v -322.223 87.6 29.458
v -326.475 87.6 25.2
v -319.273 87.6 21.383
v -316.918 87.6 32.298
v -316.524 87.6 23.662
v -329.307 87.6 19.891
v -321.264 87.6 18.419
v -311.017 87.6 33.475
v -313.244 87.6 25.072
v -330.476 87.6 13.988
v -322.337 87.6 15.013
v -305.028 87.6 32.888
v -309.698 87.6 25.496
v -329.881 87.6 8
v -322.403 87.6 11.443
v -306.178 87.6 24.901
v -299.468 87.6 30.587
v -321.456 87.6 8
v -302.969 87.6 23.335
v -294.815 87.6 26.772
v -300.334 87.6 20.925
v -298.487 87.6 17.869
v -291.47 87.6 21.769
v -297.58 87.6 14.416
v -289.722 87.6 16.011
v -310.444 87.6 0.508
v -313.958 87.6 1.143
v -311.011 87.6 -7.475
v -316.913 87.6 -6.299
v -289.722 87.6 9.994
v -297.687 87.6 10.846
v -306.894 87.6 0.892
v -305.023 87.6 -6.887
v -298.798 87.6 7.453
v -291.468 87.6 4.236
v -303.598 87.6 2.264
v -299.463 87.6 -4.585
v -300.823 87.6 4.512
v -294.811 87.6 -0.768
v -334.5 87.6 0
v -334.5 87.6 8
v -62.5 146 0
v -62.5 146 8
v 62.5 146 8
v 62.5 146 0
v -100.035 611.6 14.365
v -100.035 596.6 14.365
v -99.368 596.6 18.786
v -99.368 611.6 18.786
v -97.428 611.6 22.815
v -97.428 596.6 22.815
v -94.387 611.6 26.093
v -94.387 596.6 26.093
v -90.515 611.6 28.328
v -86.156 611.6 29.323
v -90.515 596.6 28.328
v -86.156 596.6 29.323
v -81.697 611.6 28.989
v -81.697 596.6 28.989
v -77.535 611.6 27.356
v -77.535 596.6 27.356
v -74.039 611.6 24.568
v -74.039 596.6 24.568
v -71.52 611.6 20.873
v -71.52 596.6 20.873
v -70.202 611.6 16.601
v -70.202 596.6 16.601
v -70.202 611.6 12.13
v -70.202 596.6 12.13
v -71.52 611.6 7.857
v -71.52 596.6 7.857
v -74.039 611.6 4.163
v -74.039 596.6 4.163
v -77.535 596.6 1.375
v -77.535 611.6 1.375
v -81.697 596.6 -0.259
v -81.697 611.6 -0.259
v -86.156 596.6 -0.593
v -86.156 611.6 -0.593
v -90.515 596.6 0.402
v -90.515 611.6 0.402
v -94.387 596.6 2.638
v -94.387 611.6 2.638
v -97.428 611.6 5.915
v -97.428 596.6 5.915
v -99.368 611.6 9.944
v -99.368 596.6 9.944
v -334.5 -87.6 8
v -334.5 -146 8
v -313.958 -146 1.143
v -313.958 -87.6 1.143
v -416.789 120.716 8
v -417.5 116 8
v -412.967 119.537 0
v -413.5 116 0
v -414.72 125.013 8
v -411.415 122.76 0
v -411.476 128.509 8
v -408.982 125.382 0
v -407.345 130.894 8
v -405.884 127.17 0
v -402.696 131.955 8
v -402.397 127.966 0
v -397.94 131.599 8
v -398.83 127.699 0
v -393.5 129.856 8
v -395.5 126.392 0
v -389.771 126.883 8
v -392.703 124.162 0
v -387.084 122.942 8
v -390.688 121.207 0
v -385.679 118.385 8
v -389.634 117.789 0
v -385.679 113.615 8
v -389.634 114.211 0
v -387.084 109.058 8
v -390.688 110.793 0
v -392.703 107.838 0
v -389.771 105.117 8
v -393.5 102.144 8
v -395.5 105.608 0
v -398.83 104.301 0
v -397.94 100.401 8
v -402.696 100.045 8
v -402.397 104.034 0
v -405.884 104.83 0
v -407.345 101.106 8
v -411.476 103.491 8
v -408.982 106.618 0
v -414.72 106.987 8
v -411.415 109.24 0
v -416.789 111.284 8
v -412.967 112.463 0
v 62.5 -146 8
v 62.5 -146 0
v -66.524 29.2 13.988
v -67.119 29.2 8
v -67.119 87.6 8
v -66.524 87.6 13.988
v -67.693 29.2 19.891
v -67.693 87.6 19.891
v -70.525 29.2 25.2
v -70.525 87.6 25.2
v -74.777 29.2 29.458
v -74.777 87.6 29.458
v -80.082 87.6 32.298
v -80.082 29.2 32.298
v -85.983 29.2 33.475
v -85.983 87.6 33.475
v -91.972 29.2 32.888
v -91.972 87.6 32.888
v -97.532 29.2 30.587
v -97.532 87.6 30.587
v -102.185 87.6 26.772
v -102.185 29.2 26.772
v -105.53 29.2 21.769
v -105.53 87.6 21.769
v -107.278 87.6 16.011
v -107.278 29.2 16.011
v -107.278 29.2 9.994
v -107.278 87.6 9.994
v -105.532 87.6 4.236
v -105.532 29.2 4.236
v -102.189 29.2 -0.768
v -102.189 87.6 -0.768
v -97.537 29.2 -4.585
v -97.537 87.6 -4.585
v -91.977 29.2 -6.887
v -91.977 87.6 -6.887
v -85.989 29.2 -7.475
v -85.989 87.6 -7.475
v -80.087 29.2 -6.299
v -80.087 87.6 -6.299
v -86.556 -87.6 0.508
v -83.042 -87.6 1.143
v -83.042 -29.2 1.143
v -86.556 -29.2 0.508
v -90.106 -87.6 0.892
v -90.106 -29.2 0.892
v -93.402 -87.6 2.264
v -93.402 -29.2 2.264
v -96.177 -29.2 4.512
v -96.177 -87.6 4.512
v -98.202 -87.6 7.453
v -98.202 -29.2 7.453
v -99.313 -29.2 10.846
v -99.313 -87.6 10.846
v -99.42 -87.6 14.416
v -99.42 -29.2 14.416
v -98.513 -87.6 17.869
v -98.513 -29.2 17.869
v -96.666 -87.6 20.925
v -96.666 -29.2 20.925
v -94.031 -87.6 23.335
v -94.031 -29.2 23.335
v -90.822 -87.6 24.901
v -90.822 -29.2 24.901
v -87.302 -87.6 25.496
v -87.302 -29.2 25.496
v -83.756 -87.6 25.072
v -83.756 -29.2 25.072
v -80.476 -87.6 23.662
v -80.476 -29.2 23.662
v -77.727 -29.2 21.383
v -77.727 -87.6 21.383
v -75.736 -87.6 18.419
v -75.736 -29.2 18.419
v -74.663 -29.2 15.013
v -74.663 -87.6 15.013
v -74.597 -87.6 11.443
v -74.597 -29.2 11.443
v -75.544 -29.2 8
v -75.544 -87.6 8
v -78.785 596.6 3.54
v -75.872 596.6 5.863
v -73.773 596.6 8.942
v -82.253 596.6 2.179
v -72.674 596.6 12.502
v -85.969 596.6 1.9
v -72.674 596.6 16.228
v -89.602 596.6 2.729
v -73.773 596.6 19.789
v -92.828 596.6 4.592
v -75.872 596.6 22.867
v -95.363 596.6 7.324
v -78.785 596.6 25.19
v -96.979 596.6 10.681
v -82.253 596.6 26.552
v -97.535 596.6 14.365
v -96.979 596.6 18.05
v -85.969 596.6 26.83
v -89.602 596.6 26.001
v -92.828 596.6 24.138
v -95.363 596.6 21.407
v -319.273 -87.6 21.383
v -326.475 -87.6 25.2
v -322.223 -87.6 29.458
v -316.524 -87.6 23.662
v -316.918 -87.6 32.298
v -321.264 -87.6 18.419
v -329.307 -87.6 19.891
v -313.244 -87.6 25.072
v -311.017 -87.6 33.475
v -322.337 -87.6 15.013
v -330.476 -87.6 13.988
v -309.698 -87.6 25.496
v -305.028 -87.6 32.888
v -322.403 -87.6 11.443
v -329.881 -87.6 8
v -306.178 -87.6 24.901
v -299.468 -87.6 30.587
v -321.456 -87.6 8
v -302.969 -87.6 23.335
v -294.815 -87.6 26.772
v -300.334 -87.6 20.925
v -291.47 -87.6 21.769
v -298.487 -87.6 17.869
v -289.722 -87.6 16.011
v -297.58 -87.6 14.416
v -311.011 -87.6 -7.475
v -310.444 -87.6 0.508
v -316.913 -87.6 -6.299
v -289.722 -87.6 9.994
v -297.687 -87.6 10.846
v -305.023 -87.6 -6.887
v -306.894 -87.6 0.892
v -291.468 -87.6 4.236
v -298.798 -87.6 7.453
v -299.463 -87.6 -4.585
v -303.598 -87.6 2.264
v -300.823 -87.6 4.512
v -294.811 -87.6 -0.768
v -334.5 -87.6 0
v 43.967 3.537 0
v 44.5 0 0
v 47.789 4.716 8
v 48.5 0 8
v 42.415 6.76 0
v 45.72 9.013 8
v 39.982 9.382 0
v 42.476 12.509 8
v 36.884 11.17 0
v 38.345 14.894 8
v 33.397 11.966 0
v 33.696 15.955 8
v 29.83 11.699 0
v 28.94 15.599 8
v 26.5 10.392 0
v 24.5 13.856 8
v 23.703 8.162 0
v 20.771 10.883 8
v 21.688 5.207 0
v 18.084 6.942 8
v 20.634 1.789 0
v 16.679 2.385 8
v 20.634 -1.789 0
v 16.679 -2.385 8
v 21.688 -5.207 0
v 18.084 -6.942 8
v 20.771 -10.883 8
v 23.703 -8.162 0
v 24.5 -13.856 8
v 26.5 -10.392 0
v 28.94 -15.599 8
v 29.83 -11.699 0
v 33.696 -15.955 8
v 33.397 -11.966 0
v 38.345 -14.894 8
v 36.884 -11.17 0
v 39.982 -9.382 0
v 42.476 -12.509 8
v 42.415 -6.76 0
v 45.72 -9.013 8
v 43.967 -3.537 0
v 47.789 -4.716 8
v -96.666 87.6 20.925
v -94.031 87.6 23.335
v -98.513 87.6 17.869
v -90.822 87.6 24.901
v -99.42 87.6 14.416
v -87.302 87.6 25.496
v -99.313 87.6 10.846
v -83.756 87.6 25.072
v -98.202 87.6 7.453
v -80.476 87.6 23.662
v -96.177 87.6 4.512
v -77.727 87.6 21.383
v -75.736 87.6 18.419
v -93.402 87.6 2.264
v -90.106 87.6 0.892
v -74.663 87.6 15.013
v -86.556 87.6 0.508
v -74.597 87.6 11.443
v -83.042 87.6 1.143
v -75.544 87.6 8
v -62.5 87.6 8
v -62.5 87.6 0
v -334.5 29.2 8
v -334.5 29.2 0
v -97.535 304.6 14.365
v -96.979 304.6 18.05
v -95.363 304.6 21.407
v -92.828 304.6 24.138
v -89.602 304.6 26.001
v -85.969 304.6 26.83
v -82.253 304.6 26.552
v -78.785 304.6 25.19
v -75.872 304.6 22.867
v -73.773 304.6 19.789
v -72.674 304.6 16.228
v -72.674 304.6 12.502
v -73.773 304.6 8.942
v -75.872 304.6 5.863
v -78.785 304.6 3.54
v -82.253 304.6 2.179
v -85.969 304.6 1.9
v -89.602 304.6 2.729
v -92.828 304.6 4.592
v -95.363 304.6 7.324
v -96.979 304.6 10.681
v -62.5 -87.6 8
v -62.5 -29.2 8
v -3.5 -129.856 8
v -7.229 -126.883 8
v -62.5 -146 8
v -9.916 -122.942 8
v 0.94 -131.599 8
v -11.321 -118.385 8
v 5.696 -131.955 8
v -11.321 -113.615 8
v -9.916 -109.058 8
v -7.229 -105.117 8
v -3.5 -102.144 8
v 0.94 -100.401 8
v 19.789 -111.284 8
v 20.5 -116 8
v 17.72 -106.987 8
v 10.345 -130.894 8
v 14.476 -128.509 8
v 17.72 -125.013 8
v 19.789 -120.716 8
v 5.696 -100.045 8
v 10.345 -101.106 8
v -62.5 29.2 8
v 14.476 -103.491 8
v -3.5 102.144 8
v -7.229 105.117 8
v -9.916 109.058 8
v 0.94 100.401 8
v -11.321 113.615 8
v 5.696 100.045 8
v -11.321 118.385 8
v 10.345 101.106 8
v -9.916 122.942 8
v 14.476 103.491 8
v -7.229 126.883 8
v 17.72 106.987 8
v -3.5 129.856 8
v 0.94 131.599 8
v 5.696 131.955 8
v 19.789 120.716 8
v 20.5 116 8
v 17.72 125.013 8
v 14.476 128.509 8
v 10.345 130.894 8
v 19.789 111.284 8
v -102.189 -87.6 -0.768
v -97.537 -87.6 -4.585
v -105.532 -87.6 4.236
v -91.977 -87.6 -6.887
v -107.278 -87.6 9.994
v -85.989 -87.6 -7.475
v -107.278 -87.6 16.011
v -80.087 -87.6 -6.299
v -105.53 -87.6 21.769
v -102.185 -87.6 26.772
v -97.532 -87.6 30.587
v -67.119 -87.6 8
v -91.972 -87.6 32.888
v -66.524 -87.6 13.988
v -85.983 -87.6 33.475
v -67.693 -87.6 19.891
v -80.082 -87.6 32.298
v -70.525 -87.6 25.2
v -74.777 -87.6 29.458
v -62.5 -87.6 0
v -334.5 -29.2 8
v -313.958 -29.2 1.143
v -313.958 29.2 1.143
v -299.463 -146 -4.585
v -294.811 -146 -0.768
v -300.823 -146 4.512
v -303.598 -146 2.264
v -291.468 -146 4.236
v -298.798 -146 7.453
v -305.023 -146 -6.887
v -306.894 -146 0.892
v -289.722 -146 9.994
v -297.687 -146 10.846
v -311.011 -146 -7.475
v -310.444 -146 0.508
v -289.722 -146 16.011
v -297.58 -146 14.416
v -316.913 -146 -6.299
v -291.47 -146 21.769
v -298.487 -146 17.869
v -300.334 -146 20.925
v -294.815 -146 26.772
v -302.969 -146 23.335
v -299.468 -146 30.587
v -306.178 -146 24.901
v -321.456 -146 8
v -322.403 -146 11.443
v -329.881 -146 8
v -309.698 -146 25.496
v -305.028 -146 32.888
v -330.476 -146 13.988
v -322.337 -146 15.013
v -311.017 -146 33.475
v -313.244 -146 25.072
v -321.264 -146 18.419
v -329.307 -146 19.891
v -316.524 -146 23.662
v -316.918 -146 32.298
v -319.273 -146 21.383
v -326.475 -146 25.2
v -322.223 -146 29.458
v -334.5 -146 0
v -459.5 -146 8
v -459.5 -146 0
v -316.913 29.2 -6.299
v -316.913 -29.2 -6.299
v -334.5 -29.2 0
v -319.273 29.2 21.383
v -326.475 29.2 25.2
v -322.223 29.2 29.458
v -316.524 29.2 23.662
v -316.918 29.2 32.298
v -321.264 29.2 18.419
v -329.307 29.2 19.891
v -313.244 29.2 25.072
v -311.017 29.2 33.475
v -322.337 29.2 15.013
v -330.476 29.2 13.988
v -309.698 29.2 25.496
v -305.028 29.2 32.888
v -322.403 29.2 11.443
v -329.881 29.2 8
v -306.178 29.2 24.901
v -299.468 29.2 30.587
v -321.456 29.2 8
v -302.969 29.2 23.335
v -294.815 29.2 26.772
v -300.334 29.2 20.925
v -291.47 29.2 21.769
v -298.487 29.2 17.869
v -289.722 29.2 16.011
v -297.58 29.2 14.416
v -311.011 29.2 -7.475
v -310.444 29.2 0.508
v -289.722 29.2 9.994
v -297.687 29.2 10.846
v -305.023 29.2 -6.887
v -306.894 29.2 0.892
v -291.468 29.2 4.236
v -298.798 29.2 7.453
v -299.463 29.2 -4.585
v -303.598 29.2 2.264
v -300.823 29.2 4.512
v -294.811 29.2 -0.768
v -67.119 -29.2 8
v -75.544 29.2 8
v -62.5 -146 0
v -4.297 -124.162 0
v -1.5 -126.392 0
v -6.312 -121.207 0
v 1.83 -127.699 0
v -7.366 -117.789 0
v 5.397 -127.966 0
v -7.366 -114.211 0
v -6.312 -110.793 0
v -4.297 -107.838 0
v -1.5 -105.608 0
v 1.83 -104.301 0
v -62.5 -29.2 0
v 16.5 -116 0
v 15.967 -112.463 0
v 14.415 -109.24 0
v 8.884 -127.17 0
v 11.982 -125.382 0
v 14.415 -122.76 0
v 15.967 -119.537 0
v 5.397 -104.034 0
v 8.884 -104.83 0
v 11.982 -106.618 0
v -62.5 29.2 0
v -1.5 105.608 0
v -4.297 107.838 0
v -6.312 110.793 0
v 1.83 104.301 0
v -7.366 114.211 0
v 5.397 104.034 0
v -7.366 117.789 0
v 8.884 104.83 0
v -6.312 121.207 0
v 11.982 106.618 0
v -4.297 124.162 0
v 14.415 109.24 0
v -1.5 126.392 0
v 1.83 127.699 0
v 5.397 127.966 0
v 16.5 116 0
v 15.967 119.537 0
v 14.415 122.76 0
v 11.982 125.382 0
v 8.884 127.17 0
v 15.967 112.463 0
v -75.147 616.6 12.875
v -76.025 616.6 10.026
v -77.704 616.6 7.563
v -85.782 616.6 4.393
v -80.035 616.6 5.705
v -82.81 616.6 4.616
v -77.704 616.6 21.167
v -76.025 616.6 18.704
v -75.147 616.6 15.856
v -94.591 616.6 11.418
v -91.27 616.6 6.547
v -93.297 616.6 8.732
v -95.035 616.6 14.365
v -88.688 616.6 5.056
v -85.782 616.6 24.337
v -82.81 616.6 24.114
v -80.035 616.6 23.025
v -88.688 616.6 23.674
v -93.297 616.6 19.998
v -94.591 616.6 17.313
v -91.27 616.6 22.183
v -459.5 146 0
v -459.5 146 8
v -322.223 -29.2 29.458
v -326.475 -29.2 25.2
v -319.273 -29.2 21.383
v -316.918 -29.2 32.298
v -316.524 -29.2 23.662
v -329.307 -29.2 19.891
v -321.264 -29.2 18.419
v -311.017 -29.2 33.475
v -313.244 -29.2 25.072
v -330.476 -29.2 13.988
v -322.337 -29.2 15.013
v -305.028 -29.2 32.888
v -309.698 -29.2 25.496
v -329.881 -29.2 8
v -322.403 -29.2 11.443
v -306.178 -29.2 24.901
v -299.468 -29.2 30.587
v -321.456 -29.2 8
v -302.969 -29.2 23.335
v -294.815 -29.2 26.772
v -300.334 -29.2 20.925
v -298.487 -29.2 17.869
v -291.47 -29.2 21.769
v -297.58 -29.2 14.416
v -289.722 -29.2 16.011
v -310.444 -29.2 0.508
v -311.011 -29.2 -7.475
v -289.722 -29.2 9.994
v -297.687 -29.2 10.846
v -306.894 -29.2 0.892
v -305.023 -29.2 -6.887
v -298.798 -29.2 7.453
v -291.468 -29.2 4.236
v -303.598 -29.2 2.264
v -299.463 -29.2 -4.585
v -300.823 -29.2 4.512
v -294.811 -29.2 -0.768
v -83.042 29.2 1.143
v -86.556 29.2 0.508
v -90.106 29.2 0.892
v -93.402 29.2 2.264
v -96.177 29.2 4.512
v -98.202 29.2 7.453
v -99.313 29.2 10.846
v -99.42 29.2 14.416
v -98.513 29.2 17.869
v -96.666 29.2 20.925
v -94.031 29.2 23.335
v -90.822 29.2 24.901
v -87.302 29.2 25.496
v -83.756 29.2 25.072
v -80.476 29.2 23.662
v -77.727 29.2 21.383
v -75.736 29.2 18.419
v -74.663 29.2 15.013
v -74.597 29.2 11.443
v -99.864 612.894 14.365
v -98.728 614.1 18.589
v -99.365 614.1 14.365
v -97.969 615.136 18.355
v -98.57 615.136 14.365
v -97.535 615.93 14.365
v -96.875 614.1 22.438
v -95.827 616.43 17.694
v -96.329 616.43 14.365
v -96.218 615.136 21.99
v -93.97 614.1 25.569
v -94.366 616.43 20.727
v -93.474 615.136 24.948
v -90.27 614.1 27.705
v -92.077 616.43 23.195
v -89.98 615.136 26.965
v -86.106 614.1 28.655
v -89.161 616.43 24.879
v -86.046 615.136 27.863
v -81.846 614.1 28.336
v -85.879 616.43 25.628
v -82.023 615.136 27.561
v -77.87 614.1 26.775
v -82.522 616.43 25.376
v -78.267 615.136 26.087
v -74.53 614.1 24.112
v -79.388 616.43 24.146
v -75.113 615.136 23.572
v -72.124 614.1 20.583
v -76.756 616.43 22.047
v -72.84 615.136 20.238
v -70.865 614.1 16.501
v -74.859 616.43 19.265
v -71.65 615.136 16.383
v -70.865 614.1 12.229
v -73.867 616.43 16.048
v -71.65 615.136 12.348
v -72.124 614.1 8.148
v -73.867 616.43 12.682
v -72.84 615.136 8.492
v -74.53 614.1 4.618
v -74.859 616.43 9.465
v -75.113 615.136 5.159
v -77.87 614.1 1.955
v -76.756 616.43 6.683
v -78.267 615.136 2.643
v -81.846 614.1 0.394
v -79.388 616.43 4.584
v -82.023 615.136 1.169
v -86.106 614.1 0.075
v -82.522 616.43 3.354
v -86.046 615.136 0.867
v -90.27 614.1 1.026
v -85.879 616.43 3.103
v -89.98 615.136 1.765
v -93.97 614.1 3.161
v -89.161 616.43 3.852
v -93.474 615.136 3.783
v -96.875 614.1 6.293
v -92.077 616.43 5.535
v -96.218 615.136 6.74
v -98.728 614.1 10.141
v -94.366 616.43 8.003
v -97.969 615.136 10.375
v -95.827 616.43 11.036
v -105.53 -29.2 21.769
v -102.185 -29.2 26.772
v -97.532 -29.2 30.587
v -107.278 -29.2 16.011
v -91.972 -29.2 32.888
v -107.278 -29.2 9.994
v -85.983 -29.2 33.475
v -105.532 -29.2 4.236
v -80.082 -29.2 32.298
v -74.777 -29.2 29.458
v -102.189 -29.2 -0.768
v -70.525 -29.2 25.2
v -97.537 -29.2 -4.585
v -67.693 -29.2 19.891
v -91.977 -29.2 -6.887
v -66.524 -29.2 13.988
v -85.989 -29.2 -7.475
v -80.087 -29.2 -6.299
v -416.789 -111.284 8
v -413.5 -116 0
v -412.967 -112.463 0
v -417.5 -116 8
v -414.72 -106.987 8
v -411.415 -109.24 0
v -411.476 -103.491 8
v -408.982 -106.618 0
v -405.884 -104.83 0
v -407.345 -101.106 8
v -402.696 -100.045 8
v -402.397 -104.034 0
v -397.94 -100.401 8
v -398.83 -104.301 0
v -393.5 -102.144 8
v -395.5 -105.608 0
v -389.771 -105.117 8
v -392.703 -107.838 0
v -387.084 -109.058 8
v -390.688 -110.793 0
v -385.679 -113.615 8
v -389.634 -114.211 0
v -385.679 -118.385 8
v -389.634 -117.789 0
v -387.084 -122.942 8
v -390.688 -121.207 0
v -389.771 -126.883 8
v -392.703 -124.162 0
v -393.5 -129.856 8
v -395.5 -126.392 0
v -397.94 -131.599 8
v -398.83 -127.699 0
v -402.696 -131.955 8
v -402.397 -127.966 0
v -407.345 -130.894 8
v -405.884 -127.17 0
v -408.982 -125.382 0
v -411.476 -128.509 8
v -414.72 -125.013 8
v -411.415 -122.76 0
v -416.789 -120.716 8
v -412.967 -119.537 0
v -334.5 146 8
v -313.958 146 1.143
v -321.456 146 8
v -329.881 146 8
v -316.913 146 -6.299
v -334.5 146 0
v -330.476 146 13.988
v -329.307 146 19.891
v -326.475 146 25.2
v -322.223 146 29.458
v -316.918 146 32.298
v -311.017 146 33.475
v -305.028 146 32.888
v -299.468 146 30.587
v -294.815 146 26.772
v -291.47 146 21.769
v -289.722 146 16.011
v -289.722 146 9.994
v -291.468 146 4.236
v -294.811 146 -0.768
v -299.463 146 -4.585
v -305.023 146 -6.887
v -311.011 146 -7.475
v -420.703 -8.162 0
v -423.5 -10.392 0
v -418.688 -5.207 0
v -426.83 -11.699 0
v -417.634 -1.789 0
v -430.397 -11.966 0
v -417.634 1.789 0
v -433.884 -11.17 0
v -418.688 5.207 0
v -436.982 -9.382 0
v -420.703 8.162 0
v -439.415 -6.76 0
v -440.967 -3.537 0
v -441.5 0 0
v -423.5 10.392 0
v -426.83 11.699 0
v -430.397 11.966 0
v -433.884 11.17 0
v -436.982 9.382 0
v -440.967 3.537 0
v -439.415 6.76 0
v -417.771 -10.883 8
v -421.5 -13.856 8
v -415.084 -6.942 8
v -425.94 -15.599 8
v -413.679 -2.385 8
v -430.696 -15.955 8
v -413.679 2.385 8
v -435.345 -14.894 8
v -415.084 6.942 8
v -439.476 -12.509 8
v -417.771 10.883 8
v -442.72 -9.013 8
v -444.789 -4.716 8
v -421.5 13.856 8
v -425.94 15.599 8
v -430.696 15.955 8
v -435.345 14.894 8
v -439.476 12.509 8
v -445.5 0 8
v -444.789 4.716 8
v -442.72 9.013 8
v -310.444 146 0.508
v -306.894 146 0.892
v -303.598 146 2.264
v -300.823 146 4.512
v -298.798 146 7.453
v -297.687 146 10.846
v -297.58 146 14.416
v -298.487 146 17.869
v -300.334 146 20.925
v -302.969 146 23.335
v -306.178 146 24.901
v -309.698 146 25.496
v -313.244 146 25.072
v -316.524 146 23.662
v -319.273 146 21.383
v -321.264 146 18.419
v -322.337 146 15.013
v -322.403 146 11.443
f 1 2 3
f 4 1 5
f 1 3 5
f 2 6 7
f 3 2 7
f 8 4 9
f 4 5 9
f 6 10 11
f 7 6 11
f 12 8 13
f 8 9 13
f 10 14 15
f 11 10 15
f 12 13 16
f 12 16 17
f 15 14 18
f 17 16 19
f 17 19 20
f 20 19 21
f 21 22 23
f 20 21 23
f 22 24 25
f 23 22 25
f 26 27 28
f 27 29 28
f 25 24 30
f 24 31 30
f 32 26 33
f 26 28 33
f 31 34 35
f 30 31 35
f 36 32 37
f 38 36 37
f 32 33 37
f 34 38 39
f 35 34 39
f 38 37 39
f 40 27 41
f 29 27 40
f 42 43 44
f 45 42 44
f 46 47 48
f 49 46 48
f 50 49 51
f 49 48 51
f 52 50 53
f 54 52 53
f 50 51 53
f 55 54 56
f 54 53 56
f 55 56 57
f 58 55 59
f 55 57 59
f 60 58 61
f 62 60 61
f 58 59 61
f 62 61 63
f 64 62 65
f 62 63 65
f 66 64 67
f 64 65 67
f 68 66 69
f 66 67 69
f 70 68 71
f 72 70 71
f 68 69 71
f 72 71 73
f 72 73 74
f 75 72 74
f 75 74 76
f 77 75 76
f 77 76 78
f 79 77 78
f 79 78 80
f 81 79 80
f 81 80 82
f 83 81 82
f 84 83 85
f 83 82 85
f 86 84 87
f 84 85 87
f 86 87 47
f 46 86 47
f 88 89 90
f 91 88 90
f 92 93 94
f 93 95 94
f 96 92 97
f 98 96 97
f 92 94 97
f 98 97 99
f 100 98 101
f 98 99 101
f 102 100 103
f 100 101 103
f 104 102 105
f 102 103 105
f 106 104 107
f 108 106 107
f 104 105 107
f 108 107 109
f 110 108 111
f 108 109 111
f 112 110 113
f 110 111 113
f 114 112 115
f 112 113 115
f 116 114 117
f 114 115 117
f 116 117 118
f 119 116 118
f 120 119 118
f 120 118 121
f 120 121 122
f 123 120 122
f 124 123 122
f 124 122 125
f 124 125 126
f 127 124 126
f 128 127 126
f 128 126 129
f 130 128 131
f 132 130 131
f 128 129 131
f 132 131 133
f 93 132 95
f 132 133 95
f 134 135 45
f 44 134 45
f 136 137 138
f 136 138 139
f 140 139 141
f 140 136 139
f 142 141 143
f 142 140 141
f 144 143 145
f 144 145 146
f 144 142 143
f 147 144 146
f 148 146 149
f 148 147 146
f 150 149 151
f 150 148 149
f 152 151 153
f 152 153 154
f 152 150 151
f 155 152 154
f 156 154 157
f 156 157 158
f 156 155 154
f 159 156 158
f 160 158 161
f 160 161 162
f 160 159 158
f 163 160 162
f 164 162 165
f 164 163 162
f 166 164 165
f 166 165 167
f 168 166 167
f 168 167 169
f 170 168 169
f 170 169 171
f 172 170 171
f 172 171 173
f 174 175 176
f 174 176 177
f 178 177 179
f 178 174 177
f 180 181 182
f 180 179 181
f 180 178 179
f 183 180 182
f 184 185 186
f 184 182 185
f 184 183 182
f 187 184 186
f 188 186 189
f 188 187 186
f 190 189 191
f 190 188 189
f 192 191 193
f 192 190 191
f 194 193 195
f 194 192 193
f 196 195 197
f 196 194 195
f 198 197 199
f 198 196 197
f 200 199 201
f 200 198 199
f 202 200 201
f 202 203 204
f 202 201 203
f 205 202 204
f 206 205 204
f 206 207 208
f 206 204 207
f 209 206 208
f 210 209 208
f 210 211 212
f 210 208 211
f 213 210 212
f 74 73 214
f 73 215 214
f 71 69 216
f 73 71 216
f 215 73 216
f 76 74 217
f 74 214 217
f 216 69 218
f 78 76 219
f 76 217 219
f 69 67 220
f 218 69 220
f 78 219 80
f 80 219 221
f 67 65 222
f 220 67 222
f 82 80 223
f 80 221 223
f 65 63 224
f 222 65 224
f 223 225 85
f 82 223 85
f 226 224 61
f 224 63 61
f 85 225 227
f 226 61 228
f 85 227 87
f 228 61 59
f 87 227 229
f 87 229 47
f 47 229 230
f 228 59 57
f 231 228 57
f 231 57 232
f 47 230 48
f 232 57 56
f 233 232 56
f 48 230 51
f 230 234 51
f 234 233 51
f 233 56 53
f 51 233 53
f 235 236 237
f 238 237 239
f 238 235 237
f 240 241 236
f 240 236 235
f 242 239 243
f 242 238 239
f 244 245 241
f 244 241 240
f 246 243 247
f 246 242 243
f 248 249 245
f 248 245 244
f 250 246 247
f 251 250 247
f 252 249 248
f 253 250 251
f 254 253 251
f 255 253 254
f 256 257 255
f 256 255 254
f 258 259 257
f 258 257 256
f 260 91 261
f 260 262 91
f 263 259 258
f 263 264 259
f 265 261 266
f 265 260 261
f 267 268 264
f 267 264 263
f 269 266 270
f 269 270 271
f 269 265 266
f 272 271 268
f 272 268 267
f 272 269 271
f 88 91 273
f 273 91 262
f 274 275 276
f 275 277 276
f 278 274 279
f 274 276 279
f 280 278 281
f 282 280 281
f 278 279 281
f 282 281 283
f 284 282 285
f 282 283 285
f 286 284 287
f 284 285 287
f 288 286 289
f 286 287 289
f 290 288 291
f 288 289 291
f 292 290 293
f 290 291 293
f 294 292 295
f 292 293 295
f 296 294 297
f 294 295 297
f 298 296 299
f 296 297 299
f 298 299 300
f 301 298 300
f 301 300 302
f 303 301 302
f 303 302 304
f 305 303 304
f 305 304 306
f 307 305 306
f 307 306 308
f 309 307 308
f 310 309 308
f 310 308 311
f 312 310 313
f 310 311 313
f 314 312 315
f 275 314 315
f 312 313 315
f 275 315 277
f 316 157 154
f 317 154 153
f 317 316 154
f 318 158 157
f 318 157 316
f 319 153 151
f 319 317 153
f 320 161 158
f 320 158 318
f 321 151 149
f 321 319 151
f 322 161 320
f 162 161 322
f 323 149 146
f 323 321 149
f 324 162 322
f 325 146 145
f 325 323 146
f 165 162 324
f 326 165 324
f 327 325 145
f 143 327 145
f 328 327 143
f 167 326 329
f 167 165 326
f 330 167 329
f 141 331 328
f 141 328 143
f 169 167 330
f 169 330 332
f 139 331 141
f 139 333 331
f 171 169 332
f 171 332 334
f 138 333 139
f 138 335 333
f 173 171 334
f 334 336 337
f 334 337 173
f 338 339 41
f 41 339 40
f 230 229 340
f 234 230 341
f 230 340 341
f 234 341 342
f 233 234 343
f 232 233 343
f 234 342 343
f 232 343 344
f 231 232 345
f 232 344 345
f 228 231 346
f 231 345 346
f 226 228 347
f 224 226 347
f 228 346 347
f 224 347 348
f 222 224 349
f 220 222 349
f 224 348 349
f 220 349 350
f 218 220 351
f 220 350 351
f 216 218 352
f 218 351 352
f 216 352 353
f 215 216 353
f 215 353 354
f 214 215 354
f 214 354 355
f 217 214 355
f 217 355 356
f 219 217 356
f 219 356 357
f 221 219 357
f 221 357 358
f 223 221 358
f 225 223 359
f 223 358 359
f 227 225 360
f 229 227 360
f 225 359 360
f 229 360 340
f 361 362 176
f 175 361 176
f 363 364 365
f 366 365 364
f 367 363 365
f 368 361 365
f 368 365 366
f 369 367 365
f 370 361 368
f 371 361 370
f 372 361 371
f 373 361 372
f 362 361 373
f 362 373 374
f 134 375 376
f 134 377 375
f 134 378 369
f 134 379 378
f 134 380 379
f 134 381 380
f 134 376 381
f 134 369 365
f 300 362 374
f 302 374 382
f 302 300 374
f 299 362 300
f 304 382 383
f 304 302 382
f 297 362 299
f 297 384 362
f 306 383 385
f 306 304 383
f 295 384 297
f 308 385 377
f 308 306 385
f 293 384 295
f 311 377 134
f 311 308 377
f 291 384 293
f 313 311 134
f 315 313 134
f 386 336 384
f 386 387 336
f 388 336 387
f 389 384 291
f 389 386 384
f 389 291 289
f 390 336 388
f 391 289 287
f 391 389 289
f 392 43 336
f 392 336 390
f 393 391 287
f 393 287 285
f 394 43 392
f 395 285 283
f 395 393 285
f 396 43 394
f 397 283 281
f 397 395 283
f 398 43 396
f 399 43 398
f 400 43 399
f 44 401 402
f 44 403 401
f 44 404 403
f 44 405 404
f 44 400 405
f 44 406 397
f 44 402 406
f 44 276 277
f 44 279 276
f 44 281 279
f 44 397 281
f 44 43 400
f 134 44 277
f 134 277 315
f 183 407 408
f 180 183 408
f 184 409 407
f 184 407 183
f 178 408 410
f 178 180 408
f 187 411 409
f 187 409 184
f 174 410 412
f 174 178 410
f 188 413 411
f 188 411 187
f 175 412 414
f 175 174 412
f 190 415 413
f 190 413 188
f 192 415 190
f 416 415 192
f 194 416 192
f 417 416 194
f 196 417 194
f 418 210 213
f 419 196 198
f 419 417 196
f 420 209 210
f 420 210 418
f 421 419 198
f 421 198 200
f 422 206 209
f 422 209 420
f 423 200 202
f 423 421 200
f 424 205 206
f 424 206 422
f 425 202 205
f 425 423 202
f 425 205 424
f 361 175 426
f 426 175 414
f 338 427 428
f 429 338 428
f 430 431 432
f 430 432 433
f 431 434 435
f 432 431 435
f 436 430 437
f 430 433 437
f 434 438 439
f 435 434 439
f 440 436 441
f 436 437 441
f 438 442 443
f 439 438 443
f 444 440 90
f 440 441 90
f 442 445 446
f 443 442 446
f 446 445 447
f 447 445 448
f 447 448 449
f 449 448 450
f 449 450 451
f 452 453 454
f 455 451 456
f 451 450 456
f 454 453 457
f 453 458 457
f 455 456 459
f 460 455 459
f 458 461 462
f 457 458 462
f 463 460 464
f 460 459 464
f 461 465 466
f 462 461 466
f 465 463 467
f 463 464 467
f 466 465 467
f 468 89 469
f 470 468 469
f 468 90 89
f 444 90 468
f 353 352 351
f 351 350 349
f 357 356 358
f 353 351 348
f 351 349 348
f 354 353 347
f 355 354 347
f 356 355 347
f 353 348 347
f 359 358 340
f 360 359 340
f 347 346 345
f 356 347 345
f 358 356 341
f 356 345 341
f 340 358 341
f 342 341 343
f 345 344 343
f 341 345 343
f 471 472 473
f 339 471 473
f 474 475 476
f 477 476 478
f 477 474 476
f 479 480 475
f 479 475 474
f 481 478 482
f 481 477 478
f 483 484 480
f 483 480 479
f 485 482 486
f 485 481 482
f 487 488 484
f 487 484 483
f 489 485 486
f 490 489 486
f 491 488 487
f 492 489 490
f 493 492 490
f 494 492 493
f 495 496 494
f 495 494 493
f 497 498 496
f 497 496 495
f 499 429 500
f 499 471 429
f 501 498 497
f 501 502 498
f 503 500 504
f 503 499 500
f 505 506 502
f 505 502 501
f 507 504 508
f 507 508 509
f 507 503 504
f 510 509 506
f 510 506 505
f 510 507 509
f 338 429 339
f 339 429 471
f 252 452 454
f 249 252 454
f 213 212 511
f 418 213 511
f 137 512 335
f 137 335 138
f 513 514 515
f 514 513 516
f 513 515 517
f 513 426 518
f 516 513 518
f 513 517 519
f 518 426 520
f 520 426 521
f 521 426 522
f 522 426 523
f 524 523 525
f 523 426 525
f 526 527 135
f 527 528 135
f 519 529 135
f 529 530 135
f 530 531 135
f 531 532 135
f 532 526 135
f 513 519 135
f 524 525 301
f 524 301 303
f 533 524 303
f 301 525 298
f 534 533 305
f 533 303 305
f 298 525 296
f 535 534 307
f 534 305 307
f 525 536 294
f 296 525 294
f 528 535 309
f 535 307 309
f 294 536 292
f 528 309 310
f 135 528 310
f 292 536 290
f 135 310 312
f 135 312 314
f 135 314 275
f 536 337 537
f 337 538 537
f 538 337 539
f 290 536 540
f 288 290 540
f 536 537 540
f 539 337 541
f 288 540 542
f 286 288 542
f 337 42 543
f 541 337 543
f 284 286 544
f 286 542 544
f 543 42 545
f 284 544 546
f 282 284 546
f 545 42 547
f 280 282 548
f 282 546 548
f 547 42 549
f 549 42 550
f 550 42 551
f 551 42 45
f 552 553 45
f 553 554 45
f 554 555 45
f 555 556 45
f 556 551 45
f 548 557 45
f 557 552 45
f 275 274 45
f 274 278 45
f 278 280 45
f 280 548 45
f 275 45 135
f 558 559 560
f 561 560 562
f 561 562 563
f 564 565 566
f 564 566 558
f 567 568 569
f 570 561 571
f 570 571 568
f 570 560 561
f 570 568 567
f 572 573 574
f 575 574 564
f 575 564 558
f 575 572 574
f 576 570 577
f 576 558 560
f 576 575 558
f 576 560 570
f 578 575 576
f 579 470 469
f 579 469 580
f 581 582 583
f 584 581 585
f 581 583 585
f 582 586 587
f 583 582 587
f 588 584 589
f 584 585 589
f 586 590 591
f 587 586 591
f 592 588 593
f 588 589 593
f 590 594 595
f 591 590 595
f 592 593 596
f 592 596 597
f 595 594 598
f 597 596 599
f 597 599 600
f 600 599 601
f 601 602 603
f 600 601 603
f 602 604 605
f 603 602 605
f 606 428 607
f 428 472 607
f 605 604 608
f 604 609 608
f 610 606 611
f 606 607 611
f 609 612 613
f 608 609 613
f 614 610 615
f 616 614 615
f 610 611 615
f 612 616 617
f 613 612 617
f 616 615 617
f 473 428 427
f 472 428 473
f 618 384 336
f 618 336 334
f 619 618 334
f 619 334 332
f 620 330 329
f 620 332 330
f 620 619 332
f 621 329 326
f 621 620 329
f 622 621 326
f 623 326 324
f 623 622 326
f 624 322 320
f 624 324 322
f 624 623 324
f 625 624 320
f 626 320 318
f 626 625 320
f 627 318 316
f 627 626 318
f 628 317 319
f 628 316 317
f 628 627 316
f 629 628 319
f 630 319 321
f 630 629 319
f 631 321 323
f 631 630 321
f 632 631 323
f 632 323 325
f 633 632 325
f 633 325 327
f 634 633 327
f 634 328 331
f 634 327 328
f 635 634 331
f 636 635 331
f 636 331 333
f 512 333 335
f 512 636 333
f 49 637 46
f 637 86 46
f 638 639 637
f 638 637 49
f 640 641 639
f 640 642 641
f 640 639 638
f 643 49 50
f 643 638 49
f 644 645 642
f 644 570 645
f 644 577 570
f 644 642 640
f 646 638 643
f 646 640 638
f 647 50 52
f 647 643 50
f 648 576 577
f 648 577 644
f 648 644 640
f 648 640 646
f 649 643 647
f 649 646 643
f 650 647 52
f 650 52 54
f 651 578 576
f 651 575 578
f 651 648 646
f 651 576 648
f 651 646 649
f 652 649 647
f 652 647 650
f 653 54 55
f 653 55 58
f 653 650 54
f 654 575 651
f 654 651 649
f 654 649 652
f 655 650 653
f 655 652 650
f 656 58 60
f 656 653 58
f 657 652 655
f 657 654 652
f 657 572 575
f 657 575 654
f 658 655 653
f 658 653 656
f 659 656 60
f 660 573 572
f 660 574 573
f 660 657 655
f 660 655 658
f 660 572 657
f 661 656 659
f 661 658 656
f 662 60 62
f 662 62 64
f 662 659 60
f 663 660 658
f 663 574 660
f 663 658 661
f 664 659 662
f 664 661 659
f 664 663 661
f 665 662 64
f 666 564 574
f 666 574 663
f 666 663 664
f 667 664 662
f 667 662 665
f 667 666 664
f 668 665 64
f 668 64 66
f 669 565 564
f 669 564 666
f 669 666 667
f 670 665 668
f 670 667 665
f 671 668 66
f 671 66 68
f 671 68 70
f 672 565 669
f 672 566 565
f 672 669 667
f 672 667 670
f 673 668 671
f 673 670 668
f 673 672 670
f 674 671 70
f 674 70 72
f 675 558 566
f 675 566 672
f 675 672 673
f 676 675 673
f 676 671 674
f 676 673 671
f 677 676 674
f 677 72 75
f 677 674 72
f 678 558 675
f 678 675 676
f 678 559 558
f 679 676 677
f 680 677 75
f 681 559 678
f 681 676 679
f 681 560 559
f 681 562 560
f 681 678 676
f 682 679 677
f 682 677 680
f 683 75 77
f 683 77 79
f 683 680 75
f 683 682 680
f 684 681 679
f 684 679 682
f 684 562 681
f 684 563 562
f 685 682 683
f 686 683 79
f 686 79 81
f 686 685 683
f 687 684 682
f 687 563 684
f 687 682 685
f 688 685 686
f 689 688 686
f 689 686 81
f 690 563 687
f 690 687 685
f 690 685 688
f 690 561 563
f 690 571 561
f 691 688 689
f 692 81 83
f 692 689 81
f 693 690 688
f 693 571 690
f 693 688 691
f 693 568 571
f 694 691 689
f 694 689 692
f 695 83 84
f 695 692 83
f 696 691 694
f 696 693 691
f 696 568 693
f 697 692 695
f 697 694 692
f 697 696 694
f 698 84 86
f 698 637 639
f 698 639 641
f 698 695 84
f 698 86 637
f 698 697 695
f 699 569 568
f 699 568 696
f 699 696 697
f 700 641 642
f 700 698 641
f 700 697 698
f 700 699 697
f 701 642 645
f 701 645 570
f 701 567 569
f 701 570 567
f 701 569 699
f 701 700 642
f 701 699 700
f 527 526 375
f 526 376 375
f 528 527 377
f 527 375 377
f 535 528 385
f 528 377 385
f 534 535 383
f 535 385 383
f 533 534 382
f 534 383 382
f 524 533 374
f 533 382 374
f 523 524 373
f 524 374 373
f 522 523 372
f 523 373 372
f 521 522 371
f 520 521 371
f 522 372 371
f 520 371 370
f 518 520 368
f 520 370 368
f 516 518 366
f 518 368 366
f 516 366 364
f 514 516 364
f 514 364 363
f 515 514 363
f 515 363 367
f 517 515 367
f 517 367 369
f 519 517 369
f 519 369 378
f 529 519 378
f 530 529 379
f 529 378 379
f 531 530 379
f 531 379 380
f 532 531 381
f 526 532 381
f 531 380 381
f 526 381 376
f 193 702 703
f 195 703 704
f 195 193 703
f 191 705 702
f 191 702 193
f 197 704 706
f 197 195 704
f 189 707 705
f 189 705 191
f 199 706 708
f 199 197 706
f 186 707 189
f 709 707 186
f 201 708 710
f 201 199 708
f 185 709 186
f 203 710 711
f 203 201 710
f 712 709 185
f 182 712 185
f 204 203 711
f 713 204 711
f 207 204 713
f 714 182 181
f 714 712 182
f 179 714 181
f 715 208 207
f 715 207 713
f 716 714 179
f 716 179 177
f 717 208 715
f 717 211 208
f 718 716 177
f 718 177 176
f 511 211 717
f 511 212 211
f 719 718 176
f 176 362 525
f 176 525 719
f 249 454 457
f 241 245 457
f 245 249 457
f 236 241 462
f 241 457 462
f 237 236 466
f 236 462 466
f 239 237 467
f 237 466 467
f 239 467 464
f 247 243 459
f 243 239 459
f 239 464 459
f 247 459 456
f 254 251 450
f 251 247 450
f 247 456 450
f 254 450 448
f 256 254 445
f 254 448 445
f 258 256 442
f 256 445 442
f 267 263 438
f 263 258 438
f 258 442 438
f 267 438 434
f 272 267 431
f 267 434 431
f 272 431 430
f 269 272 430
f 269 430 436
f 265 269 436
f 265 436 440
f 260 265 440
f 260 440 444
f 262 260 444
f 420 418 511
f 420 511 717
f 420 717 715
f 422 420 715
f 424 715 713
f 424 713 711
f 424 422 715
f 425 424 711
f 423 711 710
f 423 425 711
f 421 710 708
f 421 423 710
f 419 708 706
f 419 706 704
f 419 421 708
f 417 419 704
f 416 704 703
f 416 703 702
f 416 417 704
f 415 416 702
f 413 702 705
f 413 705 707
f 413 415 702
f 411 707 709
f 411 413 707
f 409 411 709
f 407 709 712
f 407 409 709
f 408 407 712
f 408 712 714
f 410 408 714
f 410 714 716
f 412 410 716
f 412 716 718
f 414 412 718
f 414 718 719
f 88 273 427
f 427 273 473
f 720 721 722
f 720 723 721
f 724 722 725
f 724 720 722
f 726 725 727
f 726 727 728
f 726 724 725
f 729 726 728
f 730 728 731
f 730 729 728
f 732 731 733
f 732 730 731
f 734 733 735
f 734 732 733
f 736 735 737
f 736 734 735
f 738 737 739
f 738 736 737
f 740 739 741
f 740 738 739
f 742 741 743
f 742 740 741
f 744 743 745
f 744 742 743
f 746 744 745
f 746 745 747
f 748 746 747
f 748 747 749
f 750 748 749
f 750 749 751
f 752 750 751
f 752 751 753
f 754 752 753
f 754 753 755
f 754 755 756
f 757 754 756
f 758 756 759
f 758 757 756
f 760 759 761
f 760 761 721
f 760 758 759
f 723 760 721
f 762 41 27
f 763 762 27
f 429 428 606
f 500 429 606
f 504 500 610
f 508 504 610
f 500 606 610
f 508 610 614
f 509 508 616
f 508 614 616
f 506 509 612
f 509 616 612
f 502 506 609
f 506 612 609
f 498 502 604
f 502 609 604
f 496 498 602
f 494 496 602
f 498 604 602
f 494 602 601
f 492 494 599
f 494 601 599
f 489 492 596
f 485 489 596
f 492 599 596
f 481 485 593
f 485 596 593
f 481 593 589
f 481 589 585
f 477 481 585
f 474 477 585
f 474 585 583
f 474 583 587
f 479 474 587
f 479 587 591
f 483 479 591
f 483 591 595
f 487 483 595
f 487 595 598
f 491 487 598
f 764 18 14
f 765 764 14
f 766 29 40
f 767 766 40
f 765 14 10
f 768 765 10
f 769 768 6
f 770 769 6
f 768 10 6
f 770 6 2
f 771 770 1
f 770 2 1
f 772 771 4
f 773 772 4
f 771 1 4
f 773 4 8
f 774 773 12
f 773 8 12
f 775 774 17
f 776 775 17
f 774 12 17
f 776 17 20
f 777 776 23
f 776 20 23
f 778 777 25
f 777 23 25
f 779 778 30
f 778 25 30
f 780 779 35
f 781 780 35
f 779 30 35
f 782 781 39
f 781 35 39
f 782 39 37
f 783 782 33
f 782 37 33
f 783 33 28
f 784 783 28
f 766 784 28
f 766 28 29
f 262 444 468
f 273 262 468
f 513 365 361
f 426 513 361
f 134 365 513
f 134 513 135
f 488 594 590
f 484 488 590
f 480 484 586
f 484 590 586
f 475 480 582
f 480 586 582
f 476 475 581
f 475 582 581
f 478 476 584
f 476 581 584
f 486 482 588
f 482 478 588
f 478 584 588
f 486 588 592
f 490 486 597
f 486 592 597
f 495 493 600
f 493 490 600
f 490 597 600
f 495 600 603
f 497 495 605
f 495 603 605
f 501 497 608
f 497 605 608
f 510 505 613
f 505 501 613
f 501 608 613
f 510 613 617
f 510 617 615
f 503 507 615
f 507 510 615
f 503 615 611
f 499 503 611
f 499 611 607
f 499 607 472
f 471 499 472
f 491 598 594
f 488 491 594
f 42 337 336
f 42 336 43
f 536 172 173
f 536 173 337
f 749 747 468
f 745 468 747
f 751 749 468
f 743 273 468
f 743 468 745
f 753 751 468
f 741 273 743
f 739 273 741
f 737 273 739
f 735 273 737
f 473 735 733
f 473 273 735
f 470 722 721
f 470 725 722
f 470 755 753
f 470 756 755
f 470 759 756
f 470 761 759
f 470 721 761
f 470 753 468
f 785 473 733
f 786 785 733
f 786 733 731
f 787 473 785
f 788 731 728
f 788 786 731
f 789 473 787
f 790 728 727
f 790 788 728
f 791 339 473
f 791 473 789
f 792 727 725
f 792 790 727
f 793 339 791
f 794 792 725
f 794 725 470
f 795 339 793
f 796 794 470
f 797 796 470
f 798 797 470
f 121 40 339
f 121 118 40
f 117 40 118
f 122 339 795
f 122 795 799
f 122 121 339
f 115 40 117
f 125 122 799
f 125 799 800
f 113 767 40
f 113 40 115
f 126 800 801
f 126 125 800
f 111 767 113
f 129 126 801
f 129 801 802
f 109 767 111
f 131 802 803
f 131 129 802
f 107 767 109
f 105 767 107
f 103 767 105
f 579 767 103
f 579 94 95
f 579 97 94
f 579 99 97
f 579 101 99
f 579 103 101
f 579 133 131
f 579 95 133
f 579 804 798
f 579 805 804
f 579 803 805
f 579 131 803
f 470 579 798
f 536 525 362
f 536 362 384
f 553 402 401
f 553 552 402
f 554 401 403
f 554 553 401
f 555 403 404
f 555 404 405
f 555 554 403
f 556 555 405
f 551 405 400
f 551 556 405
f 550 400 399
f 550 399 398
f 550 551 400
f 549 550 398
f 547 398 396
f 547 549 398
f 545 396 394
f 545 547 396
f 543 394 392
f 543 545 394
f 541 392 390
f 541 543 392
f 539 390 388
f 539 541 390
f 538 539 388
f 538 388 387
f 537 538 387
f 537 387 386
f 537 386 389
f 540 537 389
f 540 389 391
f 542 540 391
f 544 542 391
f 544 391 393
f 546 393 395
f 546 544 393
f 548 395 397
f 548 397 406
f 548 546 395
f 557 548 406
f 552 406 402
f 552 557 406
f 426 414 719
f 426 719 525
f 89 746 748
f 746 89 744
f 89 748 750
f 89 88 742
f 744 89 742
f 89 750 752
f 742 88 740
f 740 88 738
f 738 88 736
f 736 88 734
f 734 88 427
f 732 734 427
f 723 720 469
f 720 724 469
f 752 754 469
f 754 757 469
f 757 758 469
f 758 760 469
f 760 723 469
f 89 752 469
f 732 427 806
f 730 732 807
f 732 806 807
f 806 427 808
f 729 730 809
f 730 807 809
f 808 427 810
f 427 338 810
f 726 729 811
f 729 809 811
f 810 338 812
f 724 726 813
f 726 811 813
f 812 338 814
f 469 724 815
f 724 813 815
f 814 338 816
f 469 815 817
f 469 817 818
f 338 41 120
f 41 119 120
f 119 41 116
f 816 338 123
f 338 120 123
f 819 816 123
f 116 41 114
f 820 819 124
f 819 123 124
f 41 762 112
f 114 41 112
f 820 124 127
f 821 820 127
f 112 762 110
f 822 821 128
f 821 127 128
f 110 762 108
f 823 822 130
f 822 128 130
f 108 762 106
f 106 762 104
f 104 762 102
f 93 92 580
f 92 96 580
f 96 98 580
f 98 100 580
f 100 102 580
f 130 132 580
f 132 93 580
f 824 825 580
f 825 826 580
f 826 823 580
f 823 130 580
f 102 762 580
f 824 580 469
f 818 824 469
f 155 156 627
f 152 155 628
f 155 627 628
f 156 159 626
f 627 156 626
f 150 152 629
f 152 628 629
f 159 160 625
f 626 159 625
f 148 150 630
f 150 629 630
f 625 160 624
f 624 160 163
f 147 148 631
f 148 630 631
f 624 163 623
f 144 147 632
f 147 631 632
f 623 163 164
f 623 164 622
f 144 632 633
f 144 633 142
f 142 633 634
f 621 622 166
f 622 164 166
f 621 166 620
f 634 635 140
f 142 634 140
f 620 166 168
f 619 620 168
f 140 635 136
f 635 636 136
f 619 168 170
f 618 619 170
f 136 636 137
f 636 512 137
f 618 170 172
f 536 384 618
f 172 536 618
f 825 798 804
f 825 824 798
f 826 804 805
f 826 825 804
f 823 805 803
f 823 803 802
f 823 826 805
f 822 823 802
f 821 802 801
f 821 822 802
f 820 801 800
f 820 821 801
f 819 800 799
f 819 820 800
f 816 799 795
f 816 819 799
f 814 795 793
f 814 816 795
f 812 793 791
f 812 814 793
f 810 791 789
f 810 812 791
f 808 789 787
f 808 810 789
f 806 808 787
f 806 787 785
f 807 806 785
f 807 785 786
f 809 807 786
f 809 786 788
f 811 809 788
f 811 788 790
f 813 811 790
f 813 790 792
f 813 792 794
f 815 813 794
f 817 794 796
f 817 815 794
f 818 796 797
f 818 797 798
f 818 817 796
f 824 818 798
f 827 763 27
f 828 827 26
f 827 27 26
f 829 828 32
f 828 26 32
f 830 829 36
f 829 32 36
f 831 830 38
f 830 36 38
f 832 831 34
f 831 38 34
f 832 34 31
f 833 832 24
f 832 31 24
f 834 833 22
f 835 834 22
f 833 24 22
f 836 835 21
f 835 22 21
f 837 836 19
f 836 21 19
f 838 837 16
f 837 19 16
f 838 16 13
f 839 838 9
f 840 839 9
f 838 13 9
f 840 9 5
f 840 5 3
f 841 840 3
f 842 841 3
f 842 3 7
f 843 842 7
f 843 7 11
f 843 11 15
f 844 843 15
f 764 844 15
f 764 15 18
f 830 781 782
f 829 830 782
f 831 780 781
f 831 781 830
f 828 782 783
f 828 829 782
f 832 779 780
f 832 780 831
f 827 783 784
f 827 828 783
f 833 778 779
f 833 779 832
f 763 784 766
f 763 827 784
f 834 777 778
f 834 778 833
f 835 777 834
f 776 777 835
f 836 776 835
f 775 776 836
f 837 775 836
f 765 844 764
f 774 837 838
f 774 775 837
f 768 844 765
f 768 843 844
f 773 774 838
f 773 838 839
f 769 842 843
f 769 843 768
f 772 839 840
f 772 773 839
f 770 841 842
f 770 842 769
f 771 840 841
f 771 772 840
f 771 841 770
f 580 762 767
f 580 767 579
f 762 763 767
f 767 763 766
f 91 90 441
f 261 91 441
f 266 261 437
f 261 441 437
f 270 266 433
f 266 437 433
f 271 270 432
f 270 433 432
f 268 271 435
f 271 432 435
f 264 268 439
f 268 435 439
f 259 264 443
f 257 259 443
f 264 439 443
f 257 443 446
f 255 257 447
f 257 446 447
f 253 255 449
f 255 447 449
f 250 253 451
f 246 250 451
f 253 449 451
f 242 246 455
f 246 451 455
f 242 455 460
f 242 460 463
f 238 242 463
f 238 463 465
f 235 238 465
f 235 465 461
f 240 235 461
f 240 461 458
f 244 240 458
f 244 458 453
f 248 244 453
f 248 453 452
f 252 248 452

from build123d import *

# Parameters (mm, degrees)
F1_DEPTH  = 8
F4_DEPTH  = 292
F6_R      = 12
F5_R      = 16
F12_W     = 114.7051454782
F12_H     = 58.4
F7_W      = 119.2453056574
F7_H      = 58.4
F7_W_2    = 119.245
F13_DEPTH = 50
F15_R     = 12.5
F16_DEPTH = 292
F17_R     = 15
F17_R_2   = 12.5
F18_DEPTH = 20
F19_R     = 5


with BuildPart() as f1:
    # F0 (on Top) → F1 (new body)
    with BuildSketch(Plane.XY):
        Polygon((4.5, -146), (62.5, -146), (62.5, 116), (62.5, 146), (4.5, 146), (-62.5, 146), (-62.5, -146), align=None)
    extrude(amount=F1_DEPTH)

    # F3 (on face) → F4 (join)
    with BuildSketch(Plane.XZ.offset(146)):
        with BuildLine():
            ThreePointArc((-83.0422238932, 1.1431029233), (-95.4352692932, 22.2247618913), (-75.5435607626, 8))
            Line((-75.5435607626, 8), (-67.1191046479, 8))
            ThreePointArc((-67.1191046479, 8), (-102.1852087826, 26.7716895924), (-80.0874304335, -6.2993881247))
            Line((-80.0874304335, -6.2993881247), (-62.5, 0))
            Line((-62.5, 0), (-62.5, 8))
            Line((-62.5, 8), (-83.0422238932, 1.1431029233))
        make_face()
    extrude(amount=-F4_DEPTH)

    # F6 (on face) → F8 section 0
    with BuildSketch(Plane.XY):
        with Locations((4.5, -116)):
            Circle(F6_R)
    # F5 (on face) → F8 section 1
    with BuildSketch(Plane.XY.offset(8)):
        with Locations((4.5, -116)):
            Circle(F5_R)
    loft(mode=Mode.SUBTRACT)

    # F6 (on face) → F9 section 0
    with BuildSketch(Plane.XY):
        with Locations((32.5, 0)):
            Circle(F6_R)
    # F5 (on face) → F9 section 1
    with BuildSketch(Plane.XY.offset(8)):
        with Locations((32.5, 0)):
            Circle(F5_R)
    loft(mode=Mode.SUBTRACT)

    # F5 (on face) → F10 section 0
    with BuildSketch(Plane.XY.offset(8)):
        with Locations((4.5, 116)):
            Circle(F5_R)
    # F6 (on face) → F10 section 1
    with BuildSketch(Plane.XY):
        with Locations((4.5, 116)):
            Circle(F6_R)
    loft(mode=Mode.SUBTRACT)


with BuildPart() as f11_1:
    # F11: instance of F1
    add(f1.part.mirror(Plane(origin=(-198.5, 0, 4), x_dir=(0, -1, 0), z_dir=(-1, 0, 0))))


with BuildPart() as f13_tool:
    # F12 (on face) + F7 (on face) → F13 (new body, symmetric)
    with BuildSketch(Plane.XY.offset(8)):
        with Locations((-277.1474272609, -58.4)):
            Rectangle(F12_W, F12_H)
        with Locations((-277.1474272609, 58.4)):
            Rectangle(F12_W, F12_H)
    with BuildSketch(Plane.XY.offset(8)):
        with Locations((-122.1226528287, 0)):
            Rectangle(F7_W, F7_H)
        with Locations((-122.1226528287, 116.8)):
            Rectangle(F7_W, F7_H)
        with Locations((-122.1225, -116.8)):
            Rectangle(F7_W_2, F7_H)
    extrude(amount=F13_DEPTH, both=True)


with BuildPart() as f1_1:
    add(f1.part)

    # F13: cut by f13_tool
    add(f13_tool.part, mode=Mode.SUBTRACT)


with BuildPart() as f11_1_1:
    add(f11_1.part)

    # F13: cut by f13_tool
    add(f13_tool.part, mode=Mode.SUBTRACT)


with BuildPart() as f16:
    # F15 (on offset) → F16 (new body)
    with BuildSketch(Plane(origin=(0, 304.6, 0), x_dir=(-1, 0, 0), z_dir=(0, 1, 0))):
        with Locations((85.0348398089, 14.3651356921)):
            Circle(F15_R)
    extrude(amount=F16_DEPTH)

    # F17 (on face) → F18 (join)
    with BuildSketch(Plane(origin=(0, 596.6, 0), x_dir=(-1, 0, 0), z_dir=(0, 1, 0))):
        with Locations((85.0348398089, 14.3651356921)):
            Circle(F17_R)
        with Locations((85.0348398089, 14.3651356921)):
            Circle(F17_R_2, mode=Mode.SUBTRACT)
        with Locations((85.0348398089, 14.3651356921)):
            Circle(F17_R_2)
    extrude(amount=F18_DEPTH)

    # F19
    f19_edges = [f16.edges().sort_by_distance(p)[0] for p in [
        (-70.03484, 616.6, 14.365136),
    ]]
    fillet(f19_edges, radius=F19_R)


solid = Compound([f1_1.part, f11_1_1.part, f16.part])
